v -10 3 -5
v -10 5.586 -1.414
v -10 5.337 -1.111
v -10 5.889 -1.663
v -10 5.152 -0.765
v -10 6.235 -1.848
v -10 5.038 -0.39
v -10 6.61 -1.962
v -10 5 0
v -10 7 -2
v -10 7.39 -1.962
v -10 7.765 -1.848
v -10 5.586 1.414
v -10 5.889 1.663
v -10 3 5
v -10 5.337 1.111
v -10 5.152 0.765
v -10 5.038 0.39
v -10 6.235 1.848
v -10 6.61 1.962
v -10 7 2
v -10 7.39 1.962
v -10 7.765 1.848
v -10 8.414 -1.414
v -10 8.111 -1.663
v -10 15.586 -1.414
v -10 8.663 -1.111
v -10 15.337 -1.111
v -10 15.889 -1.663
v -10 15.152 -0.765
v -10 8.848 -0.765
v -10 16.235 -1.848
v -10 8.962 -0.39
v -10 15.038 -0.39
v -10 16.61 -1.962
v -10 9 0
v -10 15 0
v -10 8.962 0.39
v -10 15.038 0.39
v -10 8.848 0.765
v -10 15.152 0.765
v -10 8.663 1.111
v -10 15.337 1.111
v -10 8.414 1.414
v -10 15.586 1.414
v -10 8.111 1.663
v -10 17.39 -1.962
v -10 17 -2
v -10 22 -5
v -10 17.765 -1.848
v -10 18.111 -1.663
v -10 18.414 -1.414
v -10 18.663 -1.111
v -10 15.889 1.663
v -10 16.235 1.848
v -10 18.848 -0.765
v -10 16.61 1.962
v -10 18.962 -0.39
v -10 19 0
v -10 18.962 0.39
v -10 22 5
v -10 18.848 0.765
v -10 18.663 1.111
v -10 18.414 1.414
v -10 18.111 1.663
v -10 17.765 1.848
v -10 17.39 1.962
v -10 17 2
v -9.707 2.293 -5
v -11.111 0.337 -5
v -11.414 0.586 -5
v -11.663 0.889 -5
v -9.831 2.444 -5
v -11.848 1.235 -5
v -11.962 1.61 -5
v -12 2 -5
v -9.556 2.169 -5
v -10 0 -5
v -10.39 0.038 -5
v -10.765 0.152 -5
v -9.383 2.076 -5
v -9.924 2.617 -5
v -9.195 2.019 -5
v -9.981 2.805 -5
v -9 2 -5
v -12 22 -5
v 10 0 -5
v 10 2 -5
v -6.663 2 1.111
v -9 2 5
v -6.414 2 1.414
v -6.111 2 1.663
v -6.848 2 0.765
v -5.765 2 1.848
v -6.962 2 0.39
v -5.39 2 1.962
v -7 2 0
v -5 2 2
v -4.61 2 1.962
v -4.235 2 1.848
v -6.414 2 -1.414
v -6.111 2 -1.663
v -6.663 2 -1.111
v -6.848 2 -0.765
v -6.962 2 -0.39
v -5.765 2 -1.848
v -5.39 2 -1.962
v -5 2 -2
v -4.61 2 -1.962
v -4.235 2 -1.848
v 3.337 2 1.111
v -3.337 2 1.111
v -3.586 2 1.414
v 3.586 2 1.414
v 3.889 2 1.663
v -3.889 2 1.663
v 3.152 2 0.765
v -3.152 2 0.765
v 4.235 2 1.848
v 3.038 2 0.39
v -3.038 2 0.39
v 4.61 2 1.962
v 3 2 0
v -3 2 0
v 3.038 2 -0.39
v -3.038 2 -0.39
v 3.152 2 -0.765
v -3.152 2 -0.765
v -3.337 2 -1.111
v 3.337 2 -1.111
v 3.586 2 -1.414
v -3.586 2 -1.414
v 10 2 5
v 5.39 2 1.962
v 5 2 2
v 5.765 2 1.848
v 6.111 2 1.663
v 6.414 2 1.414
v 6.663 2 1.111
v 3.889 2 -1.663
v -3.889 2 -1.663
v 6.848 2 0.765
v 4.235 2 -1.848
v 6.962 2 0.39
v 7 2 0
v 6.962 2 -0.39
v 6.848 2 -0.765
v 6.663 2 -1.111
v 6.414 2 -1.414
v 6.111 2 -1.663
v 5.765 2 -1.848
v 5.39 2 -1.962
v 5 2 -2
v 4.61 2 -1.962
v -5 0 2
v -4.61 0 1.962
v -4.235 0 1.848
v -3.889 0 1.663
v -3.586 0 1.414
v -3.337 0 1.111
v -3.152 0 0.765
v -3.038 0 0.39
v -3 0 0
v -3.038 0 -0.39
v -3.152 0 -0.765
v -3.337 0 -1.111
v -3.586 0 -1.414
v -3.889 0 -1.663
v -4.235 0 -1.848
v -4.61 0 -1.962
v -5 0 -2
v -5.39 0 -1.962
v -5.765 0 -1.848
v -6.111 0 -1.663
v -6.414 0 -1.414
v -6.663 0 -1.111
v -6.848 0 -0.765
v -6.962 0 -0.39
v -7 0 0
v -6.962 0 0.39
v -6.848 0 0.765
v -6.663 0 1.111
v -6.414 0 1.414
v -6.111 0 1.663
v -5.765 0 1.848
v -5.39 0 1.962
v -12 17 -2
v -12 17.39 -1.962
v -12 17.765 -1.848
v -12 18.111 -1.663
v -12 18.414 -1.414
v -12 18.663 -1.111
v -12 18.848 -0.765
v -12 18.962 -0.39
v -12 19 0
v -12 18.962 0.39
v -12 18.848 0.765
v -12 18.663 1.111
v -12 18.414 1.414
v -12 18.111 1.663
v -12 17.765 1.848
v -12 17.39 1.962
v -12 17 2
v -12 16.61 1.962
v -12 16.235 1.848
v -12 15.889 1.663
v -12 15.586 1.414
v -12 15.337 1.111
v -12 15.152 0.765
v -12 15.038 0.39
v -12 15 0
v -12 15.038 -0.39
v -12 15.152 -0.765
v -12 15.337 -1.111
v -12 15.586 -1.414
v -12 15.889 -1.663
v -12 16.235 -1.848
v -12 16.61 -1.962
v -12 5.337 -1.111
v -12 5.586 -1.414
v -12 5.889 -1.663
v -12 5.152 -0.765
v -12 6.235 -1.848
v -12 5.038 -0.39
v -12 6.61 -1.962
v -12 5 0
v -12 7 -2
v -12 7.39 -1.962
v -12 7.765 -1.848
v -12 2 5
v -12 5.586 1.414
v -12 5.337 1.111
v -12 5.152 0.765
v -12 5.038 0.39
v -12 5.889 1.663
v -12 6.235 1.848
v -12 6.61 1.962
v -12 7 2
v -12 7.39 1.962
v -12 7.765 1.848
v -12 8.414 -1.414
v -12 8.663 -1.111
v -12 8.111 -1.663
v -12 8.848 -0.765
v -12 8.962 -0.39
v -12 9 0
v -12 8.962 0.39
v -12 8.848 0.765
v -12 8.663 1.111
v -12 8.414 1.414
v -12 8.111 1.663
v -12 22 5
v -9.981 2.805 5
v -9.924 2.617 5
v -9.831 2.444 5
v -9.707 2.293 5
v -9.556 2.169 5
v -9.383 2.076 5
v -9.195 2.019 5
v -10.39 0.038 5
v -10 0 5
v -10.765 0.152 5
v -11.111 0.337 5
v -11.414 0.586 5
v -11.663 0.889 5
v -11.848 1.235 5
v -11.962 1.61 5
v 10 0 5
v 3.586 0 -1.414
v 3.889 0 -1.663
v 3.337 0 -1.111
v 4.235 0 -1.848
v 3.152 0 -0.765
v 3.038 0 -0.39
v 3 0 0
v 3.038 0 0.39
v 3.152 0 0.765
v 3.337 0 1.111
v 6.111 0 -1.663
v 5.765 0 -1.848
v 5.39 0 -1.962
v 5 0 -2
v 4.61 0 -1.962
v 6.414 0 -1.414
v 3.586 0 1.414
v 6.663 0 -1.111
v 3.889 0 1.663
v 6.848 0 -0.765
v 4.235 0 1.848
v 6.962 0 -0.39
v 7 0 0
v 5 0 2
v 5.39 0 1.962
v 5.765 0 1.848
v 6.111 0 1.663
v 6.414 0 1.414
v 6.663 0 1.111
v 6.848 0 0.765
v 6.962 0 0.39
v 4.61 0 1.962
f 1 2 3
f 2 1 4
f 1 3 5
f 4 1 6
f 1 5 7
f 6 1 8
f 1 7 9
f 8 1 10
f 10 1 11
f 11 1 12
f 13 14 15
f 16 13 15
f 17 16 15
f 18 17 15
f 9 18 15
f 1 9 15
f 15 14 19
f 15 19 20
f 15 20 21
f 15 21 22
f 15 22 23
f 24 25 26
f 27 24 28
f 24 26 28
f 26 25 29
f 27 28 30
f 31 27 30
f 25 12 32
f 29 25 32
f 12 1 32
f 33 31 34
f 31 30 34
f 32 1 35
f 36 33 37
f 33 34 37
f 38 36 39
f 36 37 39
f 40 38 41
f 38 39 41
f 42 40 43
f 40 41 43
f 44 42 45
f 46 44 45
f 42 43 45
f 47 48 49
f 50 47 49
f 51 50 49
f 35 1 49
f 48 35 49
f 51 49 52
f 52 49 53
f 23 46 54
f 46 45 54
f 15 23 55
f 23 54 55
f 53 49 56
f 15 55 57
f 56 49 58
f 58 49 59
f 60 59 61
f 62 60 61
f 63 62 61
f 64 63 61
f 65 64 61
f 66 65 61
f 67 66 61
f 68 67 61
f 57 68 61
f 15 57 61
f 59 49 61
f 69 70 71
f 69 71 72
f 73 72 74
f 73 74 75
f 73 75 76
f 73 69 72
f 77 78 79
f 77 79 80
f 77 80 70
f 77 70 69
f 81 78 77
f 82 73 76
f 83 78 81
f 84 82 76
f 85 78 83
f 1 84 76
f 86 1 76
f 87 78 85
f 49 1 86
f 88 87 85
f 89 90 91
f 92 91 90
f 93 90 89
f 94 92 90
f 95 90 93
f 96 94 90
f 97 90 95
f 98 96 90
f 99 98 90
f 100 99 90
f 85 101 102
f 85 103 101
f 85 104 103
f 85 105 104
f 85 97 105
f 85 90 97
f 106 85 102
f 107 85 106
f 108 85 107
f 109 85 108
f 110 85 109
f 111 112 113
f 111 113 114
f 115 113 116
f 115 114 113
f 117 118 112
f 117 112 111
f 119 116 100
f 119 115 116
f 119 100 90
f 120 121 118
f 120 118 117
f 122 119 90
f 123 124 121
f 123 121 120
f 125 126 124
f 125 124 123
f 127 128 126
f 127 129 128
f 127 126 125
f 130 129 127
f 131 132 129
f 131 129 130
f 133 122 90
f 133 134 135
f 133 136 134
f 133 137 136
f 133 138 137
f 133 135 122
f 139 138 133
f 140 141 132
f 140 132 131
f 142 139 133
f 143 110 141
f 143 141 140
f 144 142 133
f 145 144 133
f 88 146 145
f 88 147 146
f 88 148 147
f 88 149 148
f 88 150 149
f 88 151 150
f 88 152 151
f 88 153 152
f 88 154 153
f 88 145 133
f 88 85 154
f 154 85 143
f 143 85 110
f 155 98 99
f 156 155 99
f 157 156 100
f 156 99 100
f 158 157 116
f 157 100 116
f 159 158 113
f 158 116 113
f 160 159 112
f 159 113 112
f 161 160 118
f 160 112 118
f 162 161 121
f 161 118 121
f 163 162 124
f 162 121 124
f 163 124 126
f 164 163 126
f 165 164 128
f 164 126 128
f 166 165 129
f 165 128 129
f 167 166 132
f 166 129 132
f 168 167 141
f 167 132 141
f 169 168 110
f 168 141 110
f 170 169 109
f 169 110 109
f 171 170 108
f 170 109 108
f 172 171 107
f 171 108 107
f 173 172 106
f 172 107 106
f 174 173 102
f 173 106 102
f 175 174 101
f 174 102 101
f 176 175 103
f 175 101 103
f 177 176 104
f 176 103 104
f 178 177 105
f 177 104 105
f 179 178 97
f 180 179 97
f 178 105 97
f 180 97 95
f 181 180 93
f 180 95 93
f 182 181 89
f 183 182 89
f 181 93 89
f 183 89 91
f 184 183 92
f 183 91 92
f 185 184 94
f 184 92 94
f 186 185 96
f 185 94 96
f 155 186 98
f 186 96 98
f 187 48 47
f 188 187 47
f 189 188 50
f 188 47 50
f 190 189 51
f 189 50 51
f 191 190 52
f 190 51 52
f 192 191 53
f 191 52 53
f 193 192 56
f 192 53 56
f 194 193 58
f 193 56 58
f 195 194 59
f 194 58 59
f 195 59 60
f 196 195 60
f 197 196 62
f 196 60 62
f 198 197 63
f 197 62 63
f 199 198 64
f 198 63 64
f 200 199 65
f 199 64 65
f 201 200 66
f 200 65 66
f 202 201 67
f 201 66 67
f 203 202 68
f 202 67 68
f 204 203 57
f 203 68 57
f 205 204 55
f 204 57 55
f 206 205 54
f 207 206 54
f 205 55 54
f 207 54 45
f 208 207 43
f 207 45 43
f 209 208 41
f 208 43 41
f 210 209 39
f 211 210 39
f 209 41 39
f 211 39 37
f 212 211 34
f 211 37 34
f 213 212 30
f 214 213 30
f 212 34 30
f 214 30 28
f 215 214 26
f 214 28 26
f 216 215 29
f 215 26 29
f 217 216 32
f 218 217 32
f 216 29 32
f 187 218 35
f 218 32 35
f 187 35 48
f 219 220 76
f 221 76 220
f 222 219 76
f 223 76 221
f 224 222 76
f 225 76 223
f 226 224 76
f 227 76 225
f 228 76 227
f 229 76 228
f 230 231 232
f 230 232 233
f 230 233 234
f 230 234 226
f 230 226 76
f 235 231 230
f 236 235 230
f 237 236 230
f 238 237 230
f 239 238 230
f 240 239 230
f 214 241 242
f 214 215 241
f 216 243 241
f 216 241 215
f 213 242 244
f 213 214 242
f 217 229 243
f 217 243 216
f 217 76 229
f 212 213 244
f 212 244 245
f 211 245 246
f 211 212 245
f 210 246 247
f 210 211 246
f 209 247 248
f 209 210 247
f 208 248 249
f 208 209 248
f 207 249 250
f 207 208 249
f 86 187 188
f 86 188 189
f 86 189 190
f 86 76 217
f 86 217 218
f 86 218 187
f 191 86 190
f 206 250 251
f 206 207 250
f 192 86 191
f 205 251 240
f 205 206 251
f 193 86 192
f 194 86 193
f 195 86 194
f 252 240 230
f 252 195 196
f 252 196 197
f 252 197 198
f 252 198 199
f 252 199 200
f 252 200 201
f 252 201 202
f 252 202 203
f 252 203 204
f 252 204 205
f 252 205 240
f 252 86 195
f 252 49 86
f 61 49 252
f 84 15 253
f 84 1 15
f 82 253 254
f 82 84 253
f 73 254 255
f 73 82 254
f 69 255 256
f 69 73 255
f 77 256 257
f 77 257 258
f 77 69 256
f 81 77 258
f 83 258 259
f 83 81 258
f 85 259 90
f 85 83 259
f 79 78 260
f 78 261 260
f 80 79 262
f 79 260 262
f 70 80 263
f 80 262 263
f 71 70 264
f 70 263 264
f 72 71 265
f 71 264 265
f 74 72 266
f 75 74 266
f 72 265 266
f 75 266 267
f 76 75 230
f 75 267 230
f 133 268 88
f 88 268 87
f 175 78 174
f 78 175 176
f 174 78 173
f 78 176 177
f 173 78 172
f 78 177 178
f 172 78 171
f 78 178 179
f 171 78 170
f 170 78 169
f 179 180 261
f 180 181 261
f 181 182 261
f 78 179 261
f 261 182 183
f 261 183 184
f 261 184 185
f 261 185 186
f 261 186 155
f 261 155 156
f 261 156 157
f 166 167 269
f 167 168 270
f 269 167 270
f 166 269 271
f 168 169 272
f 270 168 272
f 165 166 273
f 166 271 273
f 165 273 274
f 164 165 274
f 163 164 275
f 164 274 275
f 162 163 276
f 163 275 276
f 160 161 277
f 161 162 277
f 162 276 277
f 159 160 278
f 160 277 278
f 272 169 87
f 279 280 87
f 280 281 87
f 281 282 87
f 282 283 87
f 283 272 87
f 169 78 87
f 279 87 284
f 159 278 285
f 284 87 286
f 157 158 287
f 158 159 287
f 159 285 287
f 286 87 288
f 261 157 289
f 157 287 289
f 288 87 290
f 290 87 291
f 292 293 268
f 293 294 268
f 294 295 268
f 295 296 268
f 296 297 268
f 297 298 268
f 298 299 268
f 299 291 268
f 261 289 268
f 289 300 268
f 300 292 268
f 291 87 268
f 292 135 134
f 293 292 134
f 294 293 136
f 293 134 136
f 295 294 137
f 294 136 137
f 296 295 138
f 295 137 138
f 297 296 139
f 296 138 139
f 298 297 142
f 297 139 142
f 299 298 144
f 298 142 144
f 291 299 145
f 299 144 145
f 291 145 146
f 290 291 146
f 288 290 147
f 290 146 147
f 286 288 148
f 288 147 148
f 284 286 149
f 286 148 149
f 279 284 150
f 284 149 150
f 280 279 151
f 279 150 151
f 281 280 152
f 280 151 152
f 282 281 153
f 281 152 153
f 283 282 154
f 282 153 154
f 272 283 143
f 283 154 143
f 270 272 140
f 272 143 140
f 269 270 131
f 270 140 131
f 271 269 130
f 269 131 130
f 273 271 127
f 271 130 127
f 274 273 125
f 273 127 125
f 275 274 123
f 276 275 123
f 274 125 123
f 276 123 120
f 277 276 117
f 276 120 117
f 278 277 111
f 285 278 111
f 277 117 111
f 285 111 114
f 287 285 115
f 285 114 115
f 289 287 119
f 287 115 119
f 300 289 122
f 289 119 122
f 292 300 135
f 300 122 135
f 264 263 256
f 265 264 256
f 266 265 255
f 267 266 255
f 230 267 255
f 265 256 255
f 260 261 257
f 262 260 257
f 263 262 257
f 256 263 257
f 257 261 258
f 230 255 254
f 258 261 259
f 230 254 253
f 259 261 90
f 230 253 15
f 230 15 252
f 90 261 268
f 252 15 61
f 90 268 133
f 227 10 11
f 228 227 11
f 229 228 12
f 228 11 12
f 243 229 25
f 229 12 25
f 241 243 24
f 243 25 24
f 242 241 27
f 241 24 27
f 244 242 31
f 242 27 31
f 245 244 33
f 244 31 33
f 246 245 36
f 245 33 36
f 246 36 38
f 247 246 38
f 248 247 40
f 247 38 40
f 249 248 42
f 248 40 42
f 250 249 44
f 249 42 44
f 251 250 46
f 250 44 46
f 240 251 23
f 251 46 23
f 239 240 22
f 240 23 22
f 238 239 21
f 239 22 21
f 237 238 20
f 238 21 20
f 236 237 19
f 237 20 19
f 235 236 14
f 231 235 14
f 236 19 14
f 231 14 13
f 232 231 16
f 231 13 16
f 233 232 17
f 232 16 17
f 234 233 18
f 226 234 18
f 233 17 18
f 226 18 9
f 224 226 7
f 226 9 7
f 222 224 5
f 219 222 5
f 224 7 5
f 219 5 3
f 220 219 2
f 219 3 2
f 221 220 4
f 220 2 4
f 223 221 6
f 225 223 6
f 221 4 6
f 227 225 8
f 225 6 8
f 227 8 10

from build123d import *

# Parameters (mm, degrees)
SKETCH1_W           = 20
SKETCH1_H           = 10
BOSS_EXTRUDE1_DEPTH = 2
SKETCH2_W           = 10
SKETCH2_H           = 22
BOSS_EXTRUDE2_DEPTH = 2
FILLET1_R           = 2
FILLET2_R           = 1
SKETCH3_R           = 2
CUT_EXTRUDE1_DEPTH  = 2
SKETCH4_R           = 2
CUT_EXTRUDE2_DEPTH  = 2


with BuildPart() as part:
    # Sketch1 → Boss-Extrude1 (new body)
    with BuildSketch(Plane(origin=(0, 0, 0), x_dir=(1, 0, 0), z_dir=(0, 1, 0))):
        Rectangle(SKETCH1_W, SKETCH1_H)
    extrude(amount=BOSS_EXTRUDE1_DEPTH)

    # Sketch2 → Boss-Extrude2 (add)
    with BuildSketch(Plane.ZY.offset(10)):
        with Locations((0, 11)):
            Rectangle(SKETCH2_W, SKETCH2_H)
    extrude(amount=BOSS_EXTRUDE2_DEPTH)

    # Fillet1
    fillet1_edges = [part.edges().sort_by_distance(p)[0] for p in [
        (-12, 0, 0),
    ]]
    fillet(fillet1_edges, radius=FILLET1_R)

    # Fillet2
    fillet2_edges = [part.edges().sort_by_distance(p)[0] for p in [
        (-10, 2, 0),
    ]]
    fillet(fillet2_edges, radius=FILLET2_R)

    # Sketch3 → Cut-Extrude1 (cut)
    with BuildSketch(Plane(origin=(0, 2, 0), x_dir=(1, 0, 0), z_dir=(0, 1, 0))):
        with Locations((-5, 0)):
            Circle(SKETCH3_R)
        with Locations((5, 0)):
            Circle(SKETCH3_R)
    extrude(amount=-CUT_EXTRUDE1_DEPTH, mode=Mode.SUBTRACT)

    # Sketch4 → Cut-Extrude2 (cut)
    with BuildSketch(Plane(origin=(-10, 0, 0), x_dir=(0, 0, -1), z_dir=(1, 0, 0))):
        with Locations((0, 17)):
            Circle(SKETCH4_R)
        with Locations((0, 7)):
            Circle(SKETCH4_R)
    extrude(amount=-CUT_EXTRUDE2_DEPTH, mode=Mode.SUBTRACT)


solid = part.part
